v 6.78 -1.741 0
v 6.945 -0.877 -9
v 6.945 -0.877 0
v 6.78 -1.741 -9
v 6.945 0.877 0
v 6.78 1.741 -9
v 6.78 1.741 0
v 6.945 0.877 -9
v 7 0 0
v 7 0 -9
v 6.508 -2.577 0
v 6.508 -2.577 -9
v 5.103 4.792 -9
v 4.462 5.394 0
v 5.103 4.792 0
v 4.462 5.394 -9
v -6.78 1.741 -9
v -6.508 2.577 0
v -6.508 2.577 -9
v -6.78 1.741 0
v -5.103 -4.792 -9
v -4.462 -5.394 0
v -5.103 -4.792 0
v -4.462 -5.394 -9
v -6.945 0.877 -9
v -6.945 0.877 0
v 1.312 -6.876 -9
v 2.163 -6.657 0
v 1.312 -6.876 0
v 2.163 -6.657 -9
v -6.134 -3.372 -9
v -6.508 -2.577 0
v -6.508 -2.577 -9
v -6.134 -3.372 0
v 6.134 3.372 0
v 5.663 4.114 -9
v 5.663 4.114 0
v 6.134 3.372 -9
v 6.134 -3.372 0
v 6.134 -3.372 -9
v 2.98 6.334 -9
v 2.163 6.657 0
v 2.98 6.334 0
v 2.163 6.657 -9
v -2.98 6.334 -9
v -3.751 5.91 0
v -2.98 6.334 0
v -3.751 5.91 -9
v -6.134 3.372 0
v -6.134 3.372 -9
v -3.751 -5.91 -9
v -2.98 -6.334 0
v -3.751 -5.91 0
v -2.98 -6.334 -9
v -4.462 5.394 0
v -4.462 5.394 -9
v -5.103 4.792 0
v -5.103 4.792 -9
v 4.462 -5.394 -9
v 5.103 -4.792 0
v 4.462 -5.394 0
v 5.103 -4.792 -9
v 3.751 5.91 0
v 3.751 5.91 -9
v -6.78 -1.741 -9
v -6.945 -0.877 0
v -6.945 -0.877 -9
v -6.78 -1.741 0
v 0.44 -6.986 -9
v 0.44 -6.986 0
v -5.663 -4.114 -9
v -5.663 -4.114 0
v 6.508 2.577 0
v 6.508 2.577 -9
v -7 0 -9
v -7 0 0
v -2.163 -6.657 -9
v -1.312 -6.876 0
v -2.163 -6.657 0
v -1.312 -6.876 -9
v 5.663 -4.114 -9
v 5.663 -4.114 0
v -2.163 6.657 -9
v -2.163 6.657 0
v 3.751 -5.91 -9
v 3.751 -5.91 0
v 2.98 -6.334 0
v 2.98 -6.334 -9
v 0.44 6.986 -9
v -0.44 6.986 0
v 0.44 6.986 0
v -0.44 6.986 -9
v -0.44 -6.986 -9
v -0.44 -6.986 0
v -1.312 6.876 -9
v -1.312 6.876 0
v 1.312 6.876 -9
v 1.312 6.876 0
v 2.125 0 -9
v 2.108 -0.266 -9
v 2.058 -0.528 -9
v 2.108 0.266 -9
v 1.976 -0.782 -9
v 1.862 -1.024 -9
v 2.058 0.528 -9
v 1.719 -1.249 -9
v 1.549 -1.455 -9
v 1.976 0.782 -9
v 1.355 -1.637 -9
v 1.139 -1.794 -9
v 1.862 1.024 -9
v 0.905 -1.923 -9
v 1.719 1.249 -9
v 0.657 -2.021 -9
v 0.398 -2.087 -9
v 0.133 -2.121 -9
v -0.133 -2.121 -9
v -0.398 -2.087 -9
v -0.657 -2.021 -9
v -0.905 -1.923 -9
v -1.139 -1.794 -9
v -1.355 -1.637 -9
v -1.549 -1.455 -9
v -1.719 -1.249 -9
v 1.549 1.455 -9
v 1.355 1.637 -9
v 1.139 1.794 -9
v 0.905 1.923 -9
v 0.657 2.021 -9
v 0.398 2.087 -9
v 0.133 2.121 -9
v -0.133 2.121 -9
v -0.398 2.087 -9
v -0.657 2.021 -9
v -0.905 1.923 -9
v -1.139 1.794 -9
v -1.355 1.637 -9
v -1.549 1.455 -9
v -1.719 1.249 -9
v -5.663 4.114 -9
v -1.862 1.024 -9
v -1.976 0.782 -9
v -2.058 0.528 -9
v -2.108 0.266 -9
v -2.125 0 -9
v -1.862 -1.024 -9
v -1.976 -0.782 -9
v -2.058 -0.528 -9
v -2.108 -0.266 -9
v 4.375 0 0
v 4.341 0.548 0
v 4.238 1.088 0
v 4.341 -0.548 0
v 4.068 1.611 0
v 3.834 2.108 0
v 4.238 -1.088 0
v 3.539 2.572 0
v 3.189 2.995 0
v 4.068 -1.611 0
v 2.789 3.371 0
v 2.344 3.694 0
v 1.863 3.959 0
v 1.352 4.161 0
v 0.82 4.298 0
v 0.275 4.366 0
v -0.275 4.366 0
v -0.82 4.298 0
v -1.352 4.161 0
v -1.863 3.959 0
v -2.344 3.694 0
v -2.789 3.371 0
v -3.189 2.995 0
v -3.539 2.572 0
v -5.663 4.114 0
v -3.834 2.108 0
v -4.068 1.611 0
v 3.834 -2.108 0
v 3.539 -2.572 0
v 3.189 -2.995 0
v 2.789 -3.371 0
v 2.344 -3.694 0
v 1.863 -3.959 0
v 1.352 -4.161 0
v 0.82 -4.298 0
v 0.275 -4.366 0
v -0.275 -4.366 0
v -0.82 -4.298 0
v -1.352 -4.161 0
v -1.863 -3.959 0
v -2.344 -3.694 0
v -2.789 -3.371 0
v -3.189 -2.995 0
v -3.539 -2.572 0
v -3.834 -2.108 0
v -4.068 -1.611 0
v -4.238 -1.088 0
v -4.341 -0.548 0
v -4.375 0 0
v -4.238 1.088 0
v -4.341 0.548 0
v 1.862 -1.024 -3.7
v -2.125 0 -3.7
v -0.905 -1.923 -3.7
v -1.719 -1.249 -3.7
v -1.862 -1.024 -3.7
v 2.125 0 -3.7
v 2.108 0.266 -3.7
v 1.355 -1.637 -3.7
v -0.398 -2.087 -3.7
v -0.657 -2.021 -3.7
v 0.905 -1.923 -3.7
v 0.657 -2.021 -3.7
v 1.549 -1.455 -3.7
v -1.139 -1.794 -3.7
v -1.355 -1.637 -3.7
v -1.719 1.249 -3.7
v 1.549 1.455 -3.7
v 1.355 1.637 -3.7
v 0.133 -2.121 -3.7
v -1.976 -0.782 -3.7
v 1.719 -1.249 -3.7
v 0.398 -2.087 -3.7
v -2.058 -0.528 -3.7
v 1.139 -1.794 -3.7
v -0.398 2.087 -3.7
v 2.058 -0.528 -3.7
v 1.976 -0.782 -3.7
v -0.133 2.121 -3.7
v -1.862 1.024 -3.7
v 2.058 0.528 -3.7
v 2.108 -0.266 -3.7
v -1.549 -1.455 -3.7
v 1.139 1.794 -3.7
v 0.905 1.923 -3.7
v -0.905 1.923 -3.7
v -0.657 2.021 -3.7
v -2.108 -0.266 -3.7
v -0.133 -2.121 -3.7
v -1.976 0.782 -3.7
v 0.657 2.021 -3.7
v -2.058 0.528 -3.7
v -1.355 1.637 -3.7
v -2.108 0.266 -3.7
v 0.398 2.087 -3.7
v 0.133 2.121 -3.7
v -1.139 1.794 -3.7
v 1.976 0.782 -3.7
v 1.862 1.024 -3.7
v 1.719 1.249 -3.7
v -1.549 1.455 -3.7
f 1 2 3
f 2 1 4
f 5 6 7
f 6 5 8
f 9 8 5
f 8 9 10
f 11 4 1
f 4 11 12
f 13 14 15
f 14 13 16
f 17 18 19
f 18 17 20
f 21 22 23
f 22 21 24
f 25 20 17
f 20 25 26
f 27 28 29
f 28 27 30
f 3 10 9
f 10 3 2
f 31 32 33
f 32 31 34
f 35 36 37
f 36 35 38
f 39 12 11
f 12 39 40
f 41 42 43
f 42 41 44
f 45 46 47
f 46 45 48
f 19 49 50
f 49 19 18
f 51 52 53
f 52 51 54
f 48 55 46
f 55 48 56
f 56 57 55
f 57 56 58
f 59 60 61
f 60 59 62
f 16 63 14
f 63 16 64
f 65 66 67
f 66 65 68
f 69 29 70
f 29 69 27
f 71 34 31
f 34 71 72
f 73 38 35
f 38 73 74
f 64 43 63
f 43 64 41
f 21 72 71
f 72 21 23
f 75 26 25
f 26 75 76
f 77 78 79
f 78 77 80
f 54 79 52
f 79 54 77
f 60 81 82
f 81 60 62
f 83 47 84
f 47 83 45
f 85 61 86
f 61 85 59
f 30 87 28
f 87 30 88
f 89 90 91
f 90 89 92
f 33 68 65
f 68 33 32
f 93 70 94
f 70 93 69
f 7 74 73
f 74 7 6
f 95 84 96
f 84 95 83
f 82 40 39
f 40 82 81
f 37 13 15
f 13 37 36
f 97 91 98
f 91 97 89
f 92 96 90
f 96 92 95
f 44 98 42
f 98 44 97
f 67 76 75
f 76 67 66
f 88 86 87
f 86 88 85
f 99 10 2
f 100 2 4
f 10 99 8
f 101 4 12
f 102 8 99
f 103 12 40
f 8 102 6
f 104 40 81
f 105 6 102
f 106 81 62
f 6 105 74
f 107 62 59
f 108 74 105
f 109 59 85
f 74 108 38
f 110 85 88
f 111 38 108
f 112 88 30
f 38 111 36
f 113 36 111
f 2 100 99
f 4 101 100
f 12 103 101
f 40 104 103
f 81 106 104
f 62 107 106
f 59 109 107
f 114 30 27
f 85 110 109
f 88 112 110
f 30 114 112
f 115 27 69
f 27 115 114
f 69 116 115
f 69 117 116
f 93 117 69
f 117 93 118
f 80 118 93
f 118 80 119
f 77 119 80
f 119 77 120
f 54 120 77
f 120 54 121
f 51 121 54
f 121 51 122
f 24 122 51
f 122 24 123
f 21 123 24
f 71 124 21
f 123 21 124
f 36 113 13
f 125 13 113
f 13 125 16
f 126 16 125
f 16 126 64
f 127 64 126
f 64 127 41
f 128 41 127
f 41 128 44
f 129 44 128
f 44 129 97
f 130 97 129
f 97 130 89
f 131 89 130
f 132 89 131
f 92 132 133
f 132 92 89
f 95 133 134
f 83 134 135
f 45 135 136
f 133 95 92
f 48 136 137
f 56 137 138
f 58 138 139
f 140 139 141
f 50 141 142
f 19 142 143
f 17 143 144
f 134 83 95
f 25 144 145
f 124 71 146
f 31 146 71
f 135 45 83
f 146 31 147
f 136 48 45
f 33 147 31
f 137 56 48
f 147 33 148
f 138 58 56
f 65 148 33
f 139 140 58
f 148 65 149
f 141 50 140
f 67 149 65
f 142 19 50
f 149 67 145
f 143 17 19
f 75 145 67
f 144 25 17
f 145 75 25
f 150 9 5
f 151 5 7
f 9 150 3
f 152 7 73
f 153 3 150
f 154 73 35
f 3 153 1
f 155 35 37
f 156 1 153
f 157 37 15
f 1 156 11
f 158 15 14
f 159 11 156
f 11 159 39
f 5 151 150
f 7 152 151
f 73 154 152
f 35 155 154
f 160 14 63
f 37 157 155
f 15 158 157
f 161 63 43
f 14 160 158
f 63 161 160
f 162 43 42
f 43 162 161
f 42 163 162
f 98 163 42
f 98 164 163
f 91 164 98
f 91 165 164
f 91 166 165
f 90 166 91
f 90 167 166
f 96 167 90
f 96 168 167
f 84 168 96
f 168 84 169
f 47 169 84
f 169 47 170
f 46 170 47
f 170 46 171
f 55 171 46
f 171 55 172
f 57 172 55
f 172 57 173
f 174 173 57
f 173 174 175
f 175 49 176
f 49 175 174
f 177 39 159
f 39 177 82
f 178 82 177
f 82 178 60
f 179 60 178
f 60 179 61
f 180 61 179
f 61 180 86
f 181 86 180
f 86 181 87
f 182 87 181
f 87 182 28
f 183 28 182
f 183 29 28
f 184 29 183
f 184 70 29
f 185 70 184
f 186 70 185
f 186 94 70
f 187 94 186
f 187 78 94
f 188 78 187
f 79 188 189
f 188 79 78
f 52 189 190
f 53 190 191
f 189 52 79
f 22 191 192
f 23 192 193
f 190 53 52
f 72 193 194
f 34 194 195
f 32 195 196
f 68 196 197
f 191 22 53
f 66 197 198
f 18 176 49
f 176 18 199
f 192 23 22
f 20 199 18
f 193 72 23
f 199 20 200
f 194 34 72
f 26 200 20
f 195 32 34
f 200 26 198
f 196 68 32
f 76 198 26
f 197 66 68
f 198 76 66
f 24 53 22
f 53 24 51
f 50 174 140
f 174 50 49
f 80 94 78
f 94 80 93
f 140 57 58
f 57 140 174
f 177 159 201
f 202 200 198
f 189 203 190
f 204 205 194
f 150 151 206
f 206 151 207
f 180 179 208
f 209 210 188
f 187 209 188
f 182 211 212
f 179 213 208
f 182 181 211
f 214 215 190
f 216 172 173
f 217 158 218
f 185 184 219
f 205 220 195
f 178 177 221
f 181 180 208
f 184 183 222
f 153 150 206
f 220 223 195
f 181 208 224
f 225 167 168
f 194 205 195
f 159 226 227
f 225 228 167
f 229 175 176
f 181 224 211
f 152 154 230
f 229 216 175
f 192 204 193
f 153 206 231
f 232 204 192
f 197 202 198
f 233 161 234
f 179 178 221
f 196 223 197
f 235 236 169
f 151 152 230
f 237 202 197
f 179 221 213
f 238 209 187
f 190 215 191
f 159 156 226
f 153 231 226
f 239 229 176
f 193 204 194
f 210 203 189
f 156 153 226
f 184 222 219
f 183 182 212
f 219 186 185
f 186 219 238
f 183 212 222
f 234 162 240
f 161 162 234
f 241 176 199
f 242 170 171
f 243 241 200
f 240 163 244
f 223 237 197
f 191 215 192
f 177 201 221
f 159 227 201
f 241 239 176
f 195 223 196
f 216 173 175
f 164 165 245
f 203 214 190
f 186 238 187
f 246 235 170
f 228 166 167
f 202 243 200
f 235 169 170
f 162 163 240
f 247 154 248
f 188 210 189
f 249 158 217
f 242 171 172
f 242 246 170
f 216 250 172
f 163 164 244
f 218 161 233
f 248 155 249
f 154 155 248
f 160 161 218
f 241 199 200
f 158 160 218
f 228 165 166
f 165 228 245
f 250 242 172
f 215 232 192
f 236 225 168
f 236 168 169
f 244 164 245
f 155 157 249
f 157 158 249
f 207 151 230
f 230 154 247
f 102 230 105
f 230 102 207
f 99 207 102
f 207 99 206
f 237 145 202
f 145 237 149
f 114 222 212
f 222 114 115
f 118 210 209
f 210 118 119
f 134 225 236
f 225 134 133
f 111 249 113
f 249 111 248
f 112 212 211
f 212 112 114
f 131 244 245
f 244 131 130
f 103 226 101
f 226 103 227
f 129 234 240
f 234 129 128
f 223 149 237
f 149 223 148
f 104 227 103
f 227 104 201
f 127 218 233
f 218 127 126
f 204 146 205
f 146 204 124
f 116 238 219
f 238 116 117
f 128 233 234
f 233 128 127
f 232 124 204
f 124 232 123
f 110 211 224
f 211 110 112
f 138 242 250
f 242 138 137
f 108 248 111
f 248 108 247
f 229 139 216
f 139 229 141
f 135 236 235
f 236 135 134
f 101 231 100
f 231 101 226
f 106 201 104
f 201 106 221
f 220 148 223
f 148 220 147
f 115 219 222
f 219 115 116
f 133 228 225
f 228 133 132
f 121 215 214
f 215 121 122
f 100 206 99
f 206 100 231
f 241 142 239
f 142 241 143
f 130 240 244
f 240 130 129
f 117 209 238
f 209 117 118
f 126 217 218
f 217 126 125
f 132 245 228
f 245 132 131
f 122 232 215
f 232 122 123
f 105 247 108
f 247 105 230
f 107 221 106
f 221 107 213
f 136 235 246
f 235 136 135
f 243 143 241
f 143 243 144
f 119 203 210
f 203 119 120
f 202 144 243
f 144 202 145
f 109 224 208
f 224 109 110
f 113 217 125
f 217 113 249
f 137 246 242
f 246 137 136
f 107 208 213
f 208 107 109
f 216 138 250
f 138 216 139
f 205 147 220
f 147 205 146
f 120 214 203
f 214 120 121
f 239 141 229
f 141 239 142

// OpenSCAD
$fn = 50;


difference() {
	union() {
		translate(v = [0, 0, -9.0000000000]) {
			cylinder(h = 9, r = 7.0000000000);
		}
		translate(v = [0, 0, -9.0000000000]) {
			cylinder(h = 9, r = 2.8750000000);
		}
	}
	union() {
		translate(v = [0, 0, 0]) {
			rotate(a = [0, 0, 0]) {
				difference() {
					union() {
						#translate(v = [0, 0, -9.0000000000]) {
							cylinder(h = 9, r = 2.0000000000);
						}
						#translate(v = [0, 0, -3.7000000000]) {
							cylinder(h = 3.7000000000, r1 = 2.1250000000, r2 = 4.3750000000);
						}
						#translate(v = [0, 0, -9.0000000000]) {
							cylinder(h = 9, r = 2.1250000000);
						}
						#translate(v = [0, 0, -9.0000000000]) {
							cylinder(h = 9, r = 2.0000000000);
						}
					}
					union();
				}
			}
		}
	}
}
